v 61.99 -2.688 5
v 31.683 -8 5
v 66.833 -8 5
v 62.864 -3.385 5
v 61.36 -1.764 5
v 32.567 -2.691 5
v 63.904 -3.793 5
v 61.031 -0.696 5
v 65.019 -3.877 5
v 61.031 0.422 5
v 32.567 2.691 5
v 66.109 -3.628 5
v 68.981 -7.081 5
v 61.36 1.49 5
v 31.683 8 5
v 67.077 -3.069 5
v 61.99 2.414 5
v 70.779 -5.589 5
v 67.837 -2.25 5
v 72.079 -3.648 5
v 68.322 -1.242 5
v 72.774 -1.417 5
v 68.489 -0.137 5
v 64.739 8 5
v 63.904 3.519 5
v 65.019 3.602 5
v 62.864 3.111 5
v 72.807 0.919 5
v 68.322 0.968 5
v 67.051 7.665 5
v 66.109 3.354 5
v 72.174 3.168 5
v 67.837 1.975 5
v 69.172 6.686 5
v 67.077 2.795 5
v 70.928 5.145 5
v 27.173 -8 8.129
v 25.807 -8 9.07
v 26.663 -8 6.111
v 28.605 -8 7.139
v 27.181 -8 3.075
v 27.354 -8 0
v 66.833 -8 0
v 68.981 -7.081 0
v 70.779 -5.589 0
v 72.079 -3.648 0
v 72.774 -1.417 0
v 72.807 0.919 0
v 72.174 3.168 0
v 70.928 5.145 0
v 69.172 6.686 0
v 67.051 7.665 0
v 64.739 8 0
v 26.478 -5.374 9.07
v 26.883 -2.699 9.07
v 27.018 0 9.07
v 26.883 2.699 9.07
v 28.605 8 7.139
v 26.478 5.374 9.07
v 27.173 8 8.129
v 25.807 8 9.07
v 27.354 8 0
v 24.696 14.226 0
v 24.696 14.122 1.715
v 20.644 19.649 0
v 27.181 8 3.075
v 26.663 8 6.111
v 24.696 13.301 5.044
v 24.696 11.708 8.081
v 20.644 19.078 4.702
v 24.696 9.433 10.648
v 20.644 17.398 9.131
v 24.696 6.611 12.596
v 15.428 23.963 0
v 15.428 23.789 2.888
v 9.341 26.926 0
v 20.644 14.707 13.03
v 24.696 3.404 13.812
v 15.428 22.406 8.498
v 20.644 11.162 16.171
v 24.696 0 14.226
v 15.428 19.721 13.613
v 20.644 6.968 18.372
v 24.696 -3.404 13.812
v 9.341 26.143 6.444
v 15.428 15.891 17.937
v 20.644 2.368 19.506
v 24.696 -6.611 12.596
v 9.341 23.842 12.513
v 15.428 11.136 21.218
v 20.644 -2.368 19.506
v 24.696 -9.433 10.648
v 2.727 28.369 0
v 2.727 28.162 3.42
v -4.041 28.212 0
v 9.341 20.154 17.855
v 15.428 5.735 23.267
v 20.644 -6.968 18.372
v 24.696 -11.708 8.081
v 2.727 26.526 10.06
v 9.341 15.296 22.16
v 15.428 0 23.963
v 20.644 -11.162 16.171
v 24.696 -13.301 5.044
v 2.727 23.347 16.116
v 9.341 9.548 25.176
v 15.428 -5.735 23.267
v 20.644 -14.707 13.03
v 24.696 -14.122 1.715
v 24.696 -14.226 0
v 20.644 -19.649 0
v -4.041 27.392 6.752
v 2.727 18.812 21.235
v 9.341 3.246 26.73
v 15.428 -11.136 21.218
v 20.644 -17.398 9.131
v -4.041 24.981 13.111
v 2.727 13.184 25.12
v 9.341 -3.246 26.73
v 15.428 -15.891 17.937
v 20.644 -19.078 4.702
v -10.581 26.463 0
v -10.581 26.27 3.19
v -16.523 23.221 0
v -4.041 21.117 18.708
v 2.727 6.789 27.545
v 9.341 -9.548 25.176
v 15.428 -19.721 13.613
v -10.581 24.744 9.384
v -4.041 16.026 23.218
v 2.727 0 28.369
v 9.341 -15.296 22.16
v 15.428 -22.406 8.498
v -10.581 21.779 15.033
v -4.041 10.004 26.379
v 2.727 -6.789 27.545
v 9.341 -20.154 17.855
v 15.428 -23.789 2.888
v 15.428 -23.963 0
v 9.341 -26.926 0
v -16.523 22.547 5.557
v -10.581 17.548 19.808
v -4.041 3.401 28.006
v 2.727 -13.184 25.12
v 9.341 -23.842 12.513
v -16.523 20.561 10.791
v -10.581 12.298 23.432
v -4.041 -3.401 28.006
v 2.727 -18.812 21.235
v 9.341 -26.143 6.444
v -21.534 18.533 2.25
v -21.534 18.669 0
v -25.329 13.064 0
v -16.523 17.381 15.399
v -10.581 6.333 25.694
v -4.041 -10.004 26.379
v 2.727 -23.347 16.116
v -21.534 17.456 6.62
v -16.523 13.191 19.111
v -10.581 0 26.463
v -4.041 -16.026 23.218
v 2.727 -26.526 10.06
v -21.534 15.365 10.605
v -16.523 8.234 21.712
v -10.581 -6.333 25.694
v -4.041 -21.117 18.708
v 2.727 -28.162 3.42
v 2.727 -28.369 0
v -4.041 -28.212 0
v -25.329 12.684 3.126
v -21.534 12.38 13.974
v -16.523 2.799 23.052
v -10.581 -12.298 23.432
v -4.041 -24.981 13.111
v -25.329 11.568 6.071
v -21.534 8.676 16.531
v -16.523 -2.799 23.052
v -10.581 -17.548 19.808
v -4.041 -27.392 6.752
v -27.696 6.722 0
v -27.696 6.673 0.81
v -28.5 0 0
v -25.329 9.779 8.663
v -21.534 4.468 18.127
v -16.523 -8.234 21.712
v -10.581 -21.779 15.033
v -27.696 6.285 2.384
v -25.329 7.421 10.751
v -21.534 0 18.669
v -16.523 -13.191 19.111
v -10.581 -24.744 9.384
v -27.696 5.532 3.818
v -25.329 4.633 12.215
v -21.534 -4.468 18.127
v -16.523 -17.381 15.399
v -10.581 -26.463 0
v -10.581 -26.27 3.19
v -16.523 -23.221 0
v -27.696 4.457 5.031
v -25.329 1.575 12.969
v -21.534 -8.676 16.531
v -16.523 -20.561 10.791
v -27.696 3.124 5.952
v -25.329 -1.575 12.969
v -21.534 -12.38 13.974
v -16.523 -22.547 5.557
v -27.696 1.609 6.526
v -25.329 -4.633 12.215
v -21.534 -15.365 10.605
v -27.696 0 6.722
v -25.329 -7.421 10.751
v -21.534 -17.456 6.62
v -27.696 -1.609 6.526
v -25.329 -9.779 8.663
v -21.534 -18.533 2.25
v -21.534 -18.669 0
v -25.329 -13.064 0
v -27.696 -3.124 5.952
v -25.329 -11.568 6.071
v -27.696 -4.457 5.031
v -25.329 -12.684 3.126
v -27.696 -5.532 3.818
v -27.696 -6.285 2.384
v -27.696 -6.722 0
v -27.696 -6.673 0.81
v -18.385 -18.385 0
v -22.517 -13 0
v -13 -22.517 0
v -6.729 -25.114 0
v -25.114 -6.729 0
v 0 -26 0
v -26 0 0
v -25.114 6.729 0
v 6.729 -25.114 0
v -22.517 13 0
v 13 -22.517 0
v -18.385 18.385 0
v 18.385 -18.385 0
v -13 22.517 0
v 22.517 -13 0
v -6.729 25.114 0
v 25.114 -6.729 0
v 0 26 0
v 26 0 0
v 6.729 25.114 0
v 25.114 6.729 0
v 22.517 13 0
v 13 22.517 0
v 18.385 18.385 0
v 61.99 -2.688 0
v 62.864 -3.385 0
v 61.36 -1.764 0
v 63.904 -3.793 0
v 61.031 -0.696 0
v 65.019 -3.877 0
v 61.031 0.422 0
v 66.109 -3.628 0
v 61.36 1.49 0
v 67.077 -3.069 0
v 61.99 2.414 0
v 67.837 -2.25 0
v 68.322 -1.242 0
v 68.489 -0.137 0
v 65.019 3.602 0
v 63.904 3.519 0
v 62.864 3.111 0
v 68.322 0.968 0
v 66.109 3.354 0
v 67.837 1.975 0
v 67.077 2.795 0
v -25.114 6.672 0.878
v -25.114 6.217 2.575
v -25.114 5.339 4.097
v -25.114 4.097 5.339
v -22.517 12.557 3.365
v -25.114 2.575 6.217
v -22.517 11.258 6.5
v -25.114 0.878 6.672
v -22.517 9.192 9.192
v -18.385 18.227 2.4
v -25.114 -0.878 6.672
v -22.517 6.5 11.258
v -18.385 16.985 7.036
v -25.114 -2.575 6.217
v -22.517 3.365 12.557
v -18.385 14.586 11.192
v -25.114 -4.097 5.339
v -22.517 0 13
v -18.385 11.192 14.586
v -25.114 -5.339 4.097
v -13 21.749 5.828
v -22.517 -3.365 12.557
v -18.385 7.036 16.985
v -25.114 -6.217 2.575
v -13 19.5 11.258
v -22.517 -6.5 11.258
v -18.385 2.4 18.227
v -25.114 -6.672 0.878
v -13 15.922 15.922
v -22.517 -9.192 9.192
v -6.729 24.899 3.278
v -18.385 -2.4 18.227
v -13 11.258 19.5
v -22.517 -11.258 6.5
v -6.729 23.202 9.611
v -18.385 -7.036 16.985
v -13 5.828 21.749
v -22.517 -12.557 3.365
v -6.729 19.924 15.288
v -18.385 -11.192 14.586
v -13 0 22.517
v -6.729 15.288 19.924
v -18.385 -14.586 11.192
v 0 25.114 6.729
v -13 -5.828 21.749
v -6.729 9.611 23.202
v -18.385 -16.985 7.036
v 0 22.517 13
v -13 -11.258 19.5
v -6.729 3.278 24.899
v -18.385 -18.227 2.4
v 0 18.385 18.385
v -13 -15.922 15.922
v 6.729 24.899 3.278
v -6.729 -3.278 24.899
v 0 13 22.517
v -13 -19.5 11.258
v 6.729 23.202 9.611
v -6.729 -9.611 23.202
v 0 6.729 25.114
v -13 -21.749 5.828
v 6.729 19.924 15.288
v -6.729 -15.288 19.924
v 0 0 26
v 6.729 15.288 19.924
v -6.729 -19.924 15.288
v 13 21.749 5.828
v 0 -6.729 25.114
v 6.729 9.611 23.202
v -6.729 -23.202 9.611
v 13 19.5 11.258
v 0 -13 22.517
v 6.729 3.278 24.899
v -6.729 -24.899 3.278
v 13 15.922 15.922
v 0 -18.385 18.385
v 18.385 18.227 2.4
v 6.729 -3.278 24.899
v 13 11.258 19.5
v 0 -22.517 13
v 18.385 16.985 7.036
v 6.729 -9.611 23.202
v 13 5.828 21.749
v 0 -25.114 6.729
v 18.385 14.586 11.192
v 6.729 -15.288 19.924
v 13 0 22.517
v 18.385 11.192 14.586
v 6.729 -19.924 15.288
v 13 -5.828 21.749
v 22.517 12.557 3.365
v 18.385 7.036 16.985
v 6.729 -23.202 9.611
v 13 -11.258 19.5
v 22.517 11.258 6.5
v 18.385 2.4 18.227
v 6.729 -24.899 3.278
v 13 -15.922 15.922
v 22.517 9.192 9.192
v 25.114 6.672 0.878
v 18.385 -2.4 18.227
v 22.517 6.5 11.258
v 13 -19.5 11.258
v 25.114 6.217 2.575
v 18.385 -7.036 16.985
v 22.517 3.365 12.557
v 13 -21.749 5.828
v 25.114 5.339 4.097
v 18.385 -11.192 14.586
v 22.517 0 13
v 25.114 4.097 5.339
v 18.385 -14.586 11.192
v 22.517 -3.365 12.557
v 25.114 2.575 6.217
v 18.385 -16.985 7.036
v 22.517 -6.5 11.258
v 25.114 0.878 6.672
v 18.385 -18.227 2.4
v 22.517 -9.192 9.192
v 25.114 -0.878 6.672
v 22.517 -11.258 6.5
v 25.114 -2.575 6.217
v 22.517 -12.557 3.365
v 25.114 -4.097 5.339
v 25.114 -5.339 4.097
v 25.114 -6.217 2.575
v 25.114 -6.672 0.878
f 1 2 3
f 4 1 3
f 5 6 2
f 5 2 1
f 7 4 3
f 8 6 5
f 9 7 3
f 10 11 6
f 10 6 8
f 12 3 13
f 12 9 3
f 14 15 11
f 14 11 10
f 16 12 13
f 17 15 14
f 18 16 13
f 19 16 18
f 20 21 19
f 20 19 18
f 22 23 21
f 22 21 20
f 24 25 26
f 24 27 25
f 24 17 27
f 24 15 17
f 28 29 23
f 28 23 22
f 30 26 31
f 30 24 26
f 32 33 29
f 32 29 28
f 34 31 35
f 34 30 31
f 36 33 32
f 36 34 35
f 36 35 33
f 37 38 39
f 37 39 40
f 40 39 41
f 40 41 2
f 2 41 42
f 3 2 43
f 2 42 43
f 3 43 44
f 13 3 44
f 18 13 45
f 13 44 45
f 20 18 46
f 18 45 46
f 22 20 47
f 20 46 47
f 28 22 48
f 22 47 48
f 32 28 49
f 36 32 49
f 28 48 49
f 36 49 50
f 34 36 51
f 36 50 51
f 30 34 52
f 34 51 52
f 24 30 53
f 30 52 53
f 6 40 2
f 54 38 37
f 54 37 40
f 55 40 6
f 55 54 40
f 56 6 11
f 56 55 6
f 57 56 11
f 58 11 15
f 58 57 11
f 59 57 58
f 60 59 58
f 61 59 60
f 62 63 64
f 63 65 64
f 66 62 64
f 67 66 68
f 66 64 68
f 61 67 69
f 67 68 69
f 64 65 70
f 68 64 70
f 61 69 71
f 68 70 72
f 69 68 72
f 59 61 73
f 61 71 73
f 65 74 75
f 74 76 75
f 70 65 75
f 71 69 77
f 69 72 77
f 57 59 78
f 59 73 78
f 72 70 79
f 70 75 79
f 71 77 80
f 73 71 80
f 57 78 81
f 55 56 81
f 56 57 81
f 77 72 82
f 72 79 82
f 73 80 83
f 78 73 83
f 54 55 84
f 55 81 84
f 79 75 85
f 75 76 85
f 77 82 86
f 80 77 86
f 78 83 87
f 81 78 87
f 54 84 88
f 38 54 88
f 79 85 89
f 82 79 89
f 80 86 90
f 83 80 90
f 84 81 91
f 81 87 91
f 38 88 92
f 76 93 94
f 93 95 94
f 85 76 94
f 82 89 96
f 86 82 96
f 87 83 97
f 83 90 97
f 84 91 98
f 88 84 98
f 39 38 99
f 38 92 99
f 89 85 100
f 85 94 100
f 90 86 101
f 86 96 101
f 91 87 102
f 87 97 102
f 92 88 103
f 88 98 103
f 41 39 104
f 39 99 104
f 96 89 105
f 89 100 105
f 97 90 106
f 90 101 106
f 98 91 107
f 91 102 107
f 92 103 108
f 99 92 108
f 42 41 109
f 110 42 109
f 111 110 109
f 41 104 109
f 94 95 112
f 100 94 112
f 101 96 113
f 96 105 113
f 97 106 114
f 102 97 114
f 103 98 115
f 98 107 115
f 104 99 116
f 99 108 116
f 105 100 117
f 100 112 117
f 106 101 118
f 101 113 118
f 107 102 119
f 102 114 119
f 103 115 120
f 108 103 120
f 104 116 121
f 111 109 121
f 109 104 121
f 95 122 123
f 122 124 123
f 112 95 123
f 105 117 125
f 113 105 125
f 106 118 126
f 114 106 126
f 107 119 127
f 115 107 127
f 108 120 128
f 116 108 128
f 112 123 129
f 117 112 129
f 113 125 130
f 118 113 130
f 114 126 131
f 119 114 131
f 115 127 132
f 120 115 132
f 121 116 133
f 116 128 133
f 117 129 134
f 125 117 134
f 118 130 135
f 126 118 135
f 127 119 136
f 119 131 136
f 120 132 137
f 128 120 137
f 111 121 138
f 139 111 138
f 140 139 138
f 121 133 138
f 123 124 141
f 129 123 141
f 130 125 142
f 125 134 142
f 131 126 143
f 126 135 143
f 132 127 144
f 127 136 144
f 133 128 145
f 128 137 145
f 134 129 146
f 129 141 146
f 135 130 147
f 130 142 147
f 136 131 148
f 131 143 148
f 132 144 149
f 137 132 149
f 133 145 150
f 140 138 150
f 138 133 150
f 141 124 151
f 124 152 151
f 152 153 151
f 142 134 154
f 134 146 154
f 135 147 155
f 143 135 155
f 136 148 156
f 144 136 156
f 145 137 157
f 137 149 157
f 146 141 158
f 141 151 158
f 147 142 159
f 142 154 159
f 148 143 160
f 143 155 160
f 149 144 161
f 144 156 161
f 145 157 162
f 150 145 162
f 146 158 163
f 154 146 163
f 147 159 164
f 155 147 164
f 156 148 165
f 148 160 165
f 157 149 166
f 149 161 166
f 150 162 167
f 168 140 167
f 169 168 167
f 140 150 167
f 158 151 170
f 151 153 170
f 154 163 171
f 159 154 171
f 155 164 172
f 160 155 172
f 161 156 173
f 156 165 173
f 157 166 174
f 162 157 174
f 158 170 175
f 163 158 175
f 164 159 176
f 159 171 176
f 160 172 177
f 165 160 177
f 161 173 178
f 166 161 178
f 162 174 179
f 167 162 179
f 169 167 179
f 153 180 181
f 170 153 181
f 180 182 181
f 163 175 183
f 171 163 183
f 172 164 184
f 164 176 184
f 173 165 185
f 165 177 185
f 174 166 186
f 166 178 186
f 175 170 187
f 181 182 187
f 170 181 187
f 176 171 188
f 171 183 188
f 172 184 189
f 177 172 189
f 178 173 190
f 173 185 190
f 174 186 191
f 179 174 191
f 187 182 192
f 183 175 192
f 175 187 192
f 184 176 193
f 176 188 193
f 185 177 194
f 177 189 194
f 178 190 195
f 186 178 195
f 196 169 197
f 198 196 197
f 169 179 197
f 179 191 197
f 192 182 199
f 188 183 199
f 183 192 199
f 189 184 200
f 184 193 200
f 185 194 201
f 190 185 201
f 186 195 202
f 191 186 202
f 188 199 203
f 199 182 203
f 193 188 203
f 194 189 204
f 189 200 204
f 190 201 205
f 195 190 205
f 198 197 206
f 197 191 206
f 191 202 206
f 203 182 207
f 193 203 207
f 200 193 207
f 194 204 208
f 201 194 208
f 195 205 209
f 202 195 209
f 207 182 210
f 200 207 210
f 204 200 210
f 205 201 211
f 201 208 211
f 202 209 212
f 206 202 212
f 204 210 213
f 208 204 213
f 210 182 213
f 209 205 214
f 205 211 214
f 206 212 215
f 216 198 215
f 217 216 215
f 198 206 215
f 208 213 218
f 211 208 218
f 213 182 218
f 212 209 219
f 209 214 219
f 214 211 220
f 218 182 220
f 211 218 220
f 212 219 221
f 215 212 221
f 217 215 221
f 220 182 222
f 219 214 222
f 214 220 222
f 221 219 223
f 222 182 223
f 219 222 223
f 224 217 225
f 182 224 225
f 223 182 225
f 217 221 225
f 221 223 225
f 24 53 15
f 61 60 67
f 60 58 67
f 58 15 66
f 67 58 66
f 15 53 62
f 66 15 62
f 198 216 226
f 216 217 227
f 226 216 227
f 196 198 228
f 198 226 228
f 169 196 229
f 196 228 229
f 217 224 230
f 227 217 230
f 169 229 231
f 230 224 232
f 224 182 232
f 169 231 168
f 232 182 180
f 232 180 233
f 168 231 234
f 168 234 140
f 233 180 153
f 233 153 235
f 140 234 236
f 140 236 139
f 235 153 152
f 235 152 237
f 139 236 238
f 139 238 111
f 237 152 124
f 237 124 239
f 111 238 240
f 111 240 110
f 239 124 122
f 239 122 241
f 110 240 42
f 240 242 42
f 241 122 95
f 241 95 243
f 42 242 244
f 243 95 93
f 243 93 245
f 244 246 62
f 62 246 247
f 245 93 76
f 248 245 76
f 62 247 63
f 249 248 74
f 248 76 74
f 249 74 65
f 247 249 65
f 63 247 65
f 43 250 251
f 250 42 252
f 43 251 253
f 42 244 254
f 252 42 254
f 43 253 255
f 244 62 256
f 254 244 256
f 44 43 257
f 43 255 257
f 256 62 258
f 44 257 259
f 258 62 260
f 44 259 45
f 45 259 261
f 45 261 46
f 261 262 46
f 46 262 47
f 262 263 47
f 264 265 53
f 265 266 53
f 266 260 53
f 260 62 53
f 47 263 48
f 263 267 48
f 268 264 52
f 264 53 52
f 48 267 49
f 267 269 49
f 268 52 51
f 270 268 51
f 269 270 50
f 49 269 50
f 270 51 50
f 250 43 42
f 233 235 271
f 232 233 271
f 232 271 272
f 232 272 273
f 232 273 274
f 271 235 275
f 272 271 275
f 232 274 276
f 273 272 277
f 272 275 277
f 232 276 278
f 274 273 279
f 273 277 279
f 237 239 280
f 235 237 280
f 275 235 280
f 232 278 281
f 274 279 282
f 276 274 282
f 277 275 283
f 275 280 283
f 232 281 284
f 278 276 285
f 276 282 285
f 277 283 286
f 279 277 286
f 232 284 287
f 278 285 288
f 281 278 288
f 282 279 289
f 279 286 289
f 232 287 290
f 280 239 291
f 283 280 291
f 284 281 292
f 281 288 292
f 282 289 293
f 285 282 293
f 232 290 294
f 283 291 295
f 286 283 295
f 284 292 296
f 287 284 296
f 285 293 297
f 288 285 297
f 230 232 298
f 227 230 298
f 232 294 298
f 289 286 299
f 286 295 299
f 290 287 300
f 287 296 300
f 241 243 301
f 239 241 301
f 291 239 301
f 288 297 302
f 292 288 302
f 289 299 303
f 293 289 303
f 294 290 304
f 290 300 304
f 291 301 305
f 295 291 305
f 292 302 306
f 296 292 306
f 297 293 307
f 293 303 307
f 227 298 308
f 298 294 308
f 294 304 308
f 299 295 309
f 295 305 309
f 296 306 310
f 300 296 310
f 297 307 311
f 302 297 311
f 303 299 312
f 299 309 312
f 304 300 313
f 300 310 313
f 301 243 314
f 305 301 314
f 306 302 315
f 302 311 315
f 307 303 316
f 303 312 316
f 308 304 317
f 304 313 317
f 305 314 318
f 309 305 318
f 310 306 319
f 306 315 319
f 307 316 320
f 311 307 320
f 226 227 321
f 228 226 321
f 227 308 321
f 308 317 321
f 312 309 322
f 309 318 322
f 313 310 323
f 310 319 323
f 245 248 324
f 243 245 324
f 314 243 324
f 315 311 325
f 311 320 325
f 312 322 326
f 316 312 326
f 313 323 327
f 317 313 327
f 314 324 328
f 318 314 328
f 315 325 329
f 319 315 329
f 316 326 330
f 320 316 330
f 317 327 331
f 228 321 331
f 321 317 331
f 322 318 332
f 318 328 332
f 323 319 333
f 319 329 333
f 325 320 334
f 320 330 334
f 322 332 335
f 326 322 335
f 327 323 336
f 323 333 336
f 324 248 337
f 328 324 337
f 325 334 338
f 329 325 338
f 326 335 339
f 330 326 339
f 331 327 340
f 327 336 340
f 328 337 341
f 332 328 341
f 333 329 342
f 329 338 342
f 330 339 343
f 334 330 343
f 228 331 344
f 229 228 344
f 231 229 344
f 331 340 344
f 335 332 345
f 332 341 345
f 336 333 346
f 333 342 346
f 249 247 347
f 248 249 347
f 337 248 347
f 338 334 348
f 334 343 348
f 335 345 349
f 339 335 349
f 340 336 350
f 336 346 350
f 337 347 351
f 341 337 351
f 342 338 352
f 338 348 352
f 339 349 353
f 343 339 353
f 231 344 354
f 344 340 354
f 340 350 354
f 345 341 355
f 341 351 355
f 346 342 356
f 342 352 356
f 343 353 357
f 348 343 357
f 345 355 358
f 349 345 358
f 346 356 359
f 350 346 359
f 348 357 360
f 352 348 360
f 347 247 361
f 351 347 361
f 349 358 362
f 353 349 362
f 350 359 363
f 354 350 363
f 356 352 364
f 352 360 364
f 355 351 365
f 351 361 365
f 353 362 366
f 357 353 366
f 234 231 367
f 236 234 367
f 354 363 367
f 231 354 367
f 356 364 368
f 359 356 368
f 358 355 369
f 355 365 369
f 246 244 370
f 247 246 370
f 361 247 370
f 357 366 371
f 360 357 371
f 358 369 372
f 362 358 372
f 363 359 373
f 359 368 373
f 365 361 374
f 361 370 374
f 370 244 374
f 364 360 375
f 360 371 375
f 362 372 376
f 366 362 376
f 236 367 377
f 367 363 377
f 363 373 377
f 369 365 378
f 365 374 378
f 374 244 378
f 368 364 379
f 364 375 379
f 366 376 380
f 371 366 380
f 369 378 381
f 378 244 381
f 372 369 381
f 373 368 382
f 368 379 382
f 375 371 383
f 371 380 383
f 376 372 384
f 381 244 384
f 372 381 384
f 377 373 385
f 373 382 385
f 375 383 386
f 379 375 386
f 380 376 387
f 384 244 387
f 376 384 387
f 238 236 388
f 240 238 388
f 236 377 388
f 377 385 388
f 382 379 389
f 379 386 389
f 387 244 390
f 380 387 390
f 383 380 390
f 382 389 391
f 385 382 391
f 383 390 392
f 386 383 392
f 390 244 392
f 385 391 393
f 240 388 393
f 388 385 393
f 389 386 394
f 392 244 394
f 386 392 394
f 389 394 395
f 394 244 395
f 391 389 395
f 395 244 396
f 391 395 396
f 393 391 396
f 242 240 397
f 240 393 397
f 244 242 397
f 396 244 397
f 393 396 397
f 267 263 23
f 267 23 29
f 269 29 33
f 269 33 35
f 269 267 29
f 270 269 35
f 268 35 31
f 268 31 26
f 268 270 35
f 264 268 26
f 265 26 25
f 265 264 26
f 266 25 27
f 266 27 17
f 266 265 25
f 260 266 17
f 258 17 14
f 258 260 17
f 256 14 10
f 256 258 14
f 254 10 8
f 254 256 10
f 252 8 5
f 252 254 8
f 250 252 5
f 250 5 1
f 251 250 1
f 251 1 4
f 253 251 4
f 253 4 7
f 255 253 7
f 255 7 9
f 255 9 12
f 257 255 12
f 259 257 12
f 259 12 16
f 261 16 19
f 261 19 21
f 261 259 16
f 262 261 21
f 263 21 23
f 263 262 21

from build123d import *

# Parameters (mm, degrees)
F1_ANGLE    = 180
F2_R        = 3.75
F3_DEPTH    = 5
F4_T4_ANGLE = 81.9757587875


# Not quite as in the source:
# - a fillet or chamfer that OpenCascade refuses, or shapes differently, is made with other operations: its cross-section is extruded or revolved along the edge and cut away or added
# - a feature names something its author has since deleted; it is built from what else it names


with BuildPart() as f1:
    # F0 (on Top) → F1 (revolve)
    with BuildSketch(Plane.XY):
        with BuildLine():
            ThreePointArc((-26, 0), (0, 26), (26, 0))
            Line((26, 0), (28.5, 0))
            ThreePointArc((28.5, 0), (0, 28.5), (-28.5, 0))
            Line((-28.5, 0), (-26, 0))
        make_face()
    revolve(axis=Axis((0, 0, 0), (1, 0, 0)), revolution_arc=F1_ANGLE)

    # F2 (on Top) → F3 (join)
    with BuildSketch(Plane.XY):
        with BuildLine():
            Line((64.7386337537, 8), (24.7386337537, 8))
            ThreePointArc((24.7386337537, 8), (25.6827225737, 4.0494149209), (26, 0))
            ThreePointArc((26, 0), (25.6827225737, -4.0494149209), (24.7386337537, -8))
            Line((24.7386337537, -8), (66.83281573, -8))
            ThreePointArc((66.83281573, -8), (72.8068677326, 0.918971944), (64.7386337537, 8))
        make_face()
        with Locations((64.7386337537, -0.1370499422)):
            Circle(F2_R, mode=Mode.SUBTRACT)
    extrude(amount=F3_DEPTH)

    # F4: chamfer of 5 on 1 edges, made by hand


with BuildPart() as f4_tool2:
    # F4_s3 → F4_t4 (revolve)
    with BuildSketch(Plane(origin=(0, 0, 0), x_dir=(0, 0, 1), z_dir=(-0.6558993597, -0.754848349, 0))):
        with BuildLine():
            Line((4.8832304356, -32.8400371197), (9.1867076398, -26.8558845985))
            Line((9.1867076398, -26.8558845985), (9.1548832957, -26.761083696))
            ThreePointArc((9.1548832957, -26.761083696), (7.1037600734, -27.4972106371), (4.9824561404, -27.9595266557))
            Line((4.9824561404, -27.9595266557), (4.9, -28.0579756932))
            ThreePointArc((4.9, -28.0579756932), (4.9, -30.4490064064), (4.7832304356, -32.8400371197))
            Line((4.7832304356, -32.8400371197), (4.8832304356, -32.8400371197))
        make_face()
    revolve(axis=Axis((0, 0, 5), (0, 0, 1)), revolution_arc=F4_T4_ANGLE)

    split(bisect_by=Plane.XZ.offset(8), keep=Keep.BOTTOM)

    split(bisect_by=Plane.XZ.offset(-8), keep=Keep.TOP)


with BuildPart() as f1_1:
    add(f1.part)

    # F4_t1: union F4_tool2
    add(f4_tool2.part)


solid = f1_1.part
